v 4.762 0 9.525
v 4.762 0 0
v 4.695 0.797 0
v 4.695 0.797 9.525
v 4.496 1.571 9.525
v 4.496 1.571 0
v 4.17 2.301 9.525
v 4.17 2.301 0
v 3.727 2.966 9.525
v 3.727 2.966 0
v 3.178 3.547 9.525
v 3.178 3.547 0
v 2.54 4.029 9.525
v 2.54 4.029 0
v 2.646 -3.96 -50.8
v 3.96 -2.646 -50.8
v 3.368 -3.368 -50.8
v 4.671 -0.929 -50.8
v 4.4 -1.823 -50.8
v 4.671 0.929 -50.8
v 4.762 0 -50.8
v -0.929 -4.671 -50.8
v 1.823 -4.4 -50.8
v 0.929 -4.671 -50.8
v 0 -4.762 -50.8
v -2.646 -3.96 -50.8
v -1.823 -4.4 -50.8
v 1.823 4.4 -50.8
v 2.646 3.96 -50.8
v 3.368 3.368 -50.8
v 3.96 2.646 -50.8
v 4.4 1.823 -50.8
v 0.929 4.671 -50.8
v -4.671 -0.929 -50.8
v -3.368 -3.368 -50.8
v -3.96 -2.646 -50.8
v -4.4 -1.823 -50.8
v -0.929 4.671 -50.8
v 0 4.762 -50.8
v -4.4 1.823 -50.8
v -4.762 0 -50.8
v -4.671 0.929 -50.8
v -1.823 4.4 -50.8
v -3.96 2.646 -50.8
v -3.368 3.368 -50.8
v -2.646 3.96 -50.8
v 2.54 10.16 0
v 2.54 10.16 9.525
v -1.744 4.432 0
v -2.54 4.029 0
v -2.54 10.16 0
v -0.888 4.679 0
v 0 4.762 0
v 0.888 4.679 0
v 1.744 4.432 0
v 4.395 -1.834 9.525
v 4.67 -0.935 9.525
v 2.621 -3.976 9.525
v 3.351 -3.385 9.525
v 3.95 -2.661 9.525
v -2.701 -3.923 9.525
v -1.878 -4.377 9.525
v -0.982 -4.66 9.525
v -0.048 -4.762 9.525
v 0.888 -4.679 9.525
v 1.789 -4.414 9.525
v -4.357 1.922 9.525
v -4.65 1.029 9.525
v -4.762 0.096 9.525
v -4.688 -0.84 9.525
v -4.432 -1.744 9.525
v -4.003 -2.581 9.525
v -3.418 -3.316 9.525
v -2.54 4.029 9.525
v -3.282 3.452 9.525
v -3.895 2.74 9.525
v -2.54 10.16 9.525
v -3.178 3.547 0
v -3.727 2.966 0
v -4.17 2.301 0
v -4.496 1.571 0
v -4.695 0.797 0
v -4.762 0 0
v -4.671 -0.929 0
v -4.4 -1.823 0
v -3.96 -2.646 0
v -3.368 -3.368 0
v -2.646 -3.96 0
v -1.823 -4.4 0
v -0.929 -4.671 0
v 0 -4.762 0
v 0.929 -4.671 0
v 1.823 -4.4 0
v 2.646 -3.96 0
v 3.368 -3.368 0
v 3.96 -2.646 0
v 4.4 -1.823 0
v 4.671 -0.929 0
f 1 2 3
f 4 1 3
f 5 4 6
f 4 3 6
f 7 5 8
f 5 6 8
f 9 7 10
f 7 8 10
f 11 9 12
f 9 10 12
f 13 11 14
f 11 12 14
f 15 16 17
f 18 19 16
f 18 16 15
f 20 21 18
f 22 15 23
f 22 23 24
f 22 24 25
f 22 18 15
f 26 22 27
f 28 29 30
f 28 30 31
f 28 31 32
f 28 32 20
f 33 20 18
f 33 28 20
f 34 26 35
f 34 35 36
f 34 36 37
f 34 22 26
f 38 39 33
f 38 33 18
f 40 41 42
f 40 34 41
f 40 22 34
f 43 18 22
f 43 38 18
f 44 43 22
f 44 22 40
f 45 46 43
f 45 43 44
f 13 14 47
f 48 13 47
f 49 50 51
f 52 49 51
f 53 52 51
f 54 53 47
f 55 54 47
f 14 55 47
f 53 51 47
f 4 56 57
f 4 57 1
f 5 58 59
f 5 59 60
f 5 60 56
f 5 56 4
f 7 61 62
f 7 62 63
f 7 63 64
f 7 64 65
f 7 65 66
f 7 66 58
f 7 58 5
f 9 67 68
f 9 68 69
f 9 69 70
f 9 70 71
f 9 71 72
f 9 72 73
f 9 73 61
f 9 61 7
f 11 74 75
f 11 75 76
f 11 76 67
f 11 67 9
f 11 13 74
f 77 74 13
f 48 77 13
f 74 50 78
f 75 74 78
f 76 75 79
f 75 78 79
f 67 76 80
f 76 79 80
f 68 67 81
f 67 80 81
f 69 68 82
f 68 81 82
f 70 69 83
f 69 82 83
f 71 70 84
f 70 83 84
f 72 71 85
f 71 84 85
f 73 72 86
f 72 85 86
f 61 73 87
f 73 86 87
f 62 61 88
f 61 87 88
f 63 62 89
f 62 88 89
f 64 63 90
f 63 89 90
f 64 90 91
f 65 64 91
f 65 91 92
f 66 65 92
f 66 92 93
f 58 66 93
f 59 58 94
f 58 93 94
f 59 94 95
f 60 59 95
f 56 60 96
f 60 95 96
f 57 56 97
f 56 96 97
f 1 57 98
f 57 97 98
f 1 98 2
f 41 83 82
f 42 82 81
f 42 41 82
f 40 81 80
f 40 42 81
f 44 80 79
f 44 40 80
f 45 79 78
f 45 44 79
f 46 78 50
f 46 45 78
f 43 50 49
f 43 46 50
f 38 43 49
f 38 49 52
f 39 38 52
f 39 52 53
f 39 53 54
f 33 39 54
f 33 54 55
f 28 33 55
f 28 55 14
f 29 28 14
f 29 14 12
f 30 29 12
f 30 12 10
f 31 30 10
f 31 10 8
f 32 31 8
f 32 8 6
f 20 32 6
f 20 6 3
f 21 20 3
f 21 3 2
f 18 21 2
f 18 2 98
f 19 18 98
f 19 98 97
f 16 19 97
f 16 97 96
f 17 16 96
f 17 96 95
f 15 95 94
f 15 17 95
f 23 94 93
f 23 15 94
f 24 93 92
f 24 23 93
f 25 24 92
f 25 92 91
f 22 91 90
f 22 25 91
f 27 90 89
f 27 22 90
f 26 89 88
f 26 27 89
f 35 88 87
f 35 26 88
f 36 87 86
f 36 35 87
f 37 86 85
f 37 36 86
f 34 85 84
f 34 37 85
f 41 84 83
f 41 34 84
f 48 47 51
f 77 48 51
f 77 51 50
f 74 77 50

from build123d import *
from build123d.topology import SkipClean

# Parameters (mm, degrees)
BOSS_EXTRUDE1_DEPTH = 9.525
BOSS_EXTRUDE2_START = 50.8
SKETCH2_R           = 4.7625
BOSS_EXTRUDE2_DEPTH = 50.8


with BuildPart() as part:
    # Sketch1 → Boss-Extrude1 (new body)
    with BuildSketch(Plane.XY):
        with BuildLine():
            Line((-2.54, 4.028623369), (-2.54, 0))
            Line((-2.54, 0), (2.54, 0))
            Line((2.54, 0), (2.54, 4.028623369))
            ThreePointArc((2.54, 4.028623369), (0, 4.7625), (-2.54, 4.028623369))
        make_face()
        with BuildLine():
            Line((2.54, 0), (-2.54, 0))
            Line((-2.54, 0), (-2.54, 4.028623369))
            ThreePointArc((-2.54, 4.028623369), (-2.300506058, -4.170021358), (4.7625, 0))
            ThreePointArc((4.7625, 0), (4.170021358, 2.300506058), (2.54, 4.028623369))
            Line((2.54, 4.028623369), (2.54, 0))
        make_face()
        with BuildLine():
            Line((-2.54, 10.16), (-2.54, 4.028623369))
            ThreePointArc((-2.54, 4.028623369), (0, 4.7625), (2.54, 4.028623369))
            Line((2.54, 4.028623369), (2.54, 10.16))
            Line((2.54, 10.16), (-2.54, 10.16))
        make_face()
    extrude(amount=BOSS_EXTRUDE1_DEPTH)

    # Sketch2 → Boss-Extrude2 (add)
    with SkipClean():  # the faces are left unmerged after this step: merging them gives an invalid solid
        with BuildSketch(Plane(origin=(0, 0, 0), x_dir=(-1, 0, 0), z_dir=(0, 0, -1)).offset(BOSS_EXTRUDE2_START)):
            Circle(SKETCH2_R)
        extrude(amount=-BOSS_EXTRUDE2_DEPTH)


solid = part.part
